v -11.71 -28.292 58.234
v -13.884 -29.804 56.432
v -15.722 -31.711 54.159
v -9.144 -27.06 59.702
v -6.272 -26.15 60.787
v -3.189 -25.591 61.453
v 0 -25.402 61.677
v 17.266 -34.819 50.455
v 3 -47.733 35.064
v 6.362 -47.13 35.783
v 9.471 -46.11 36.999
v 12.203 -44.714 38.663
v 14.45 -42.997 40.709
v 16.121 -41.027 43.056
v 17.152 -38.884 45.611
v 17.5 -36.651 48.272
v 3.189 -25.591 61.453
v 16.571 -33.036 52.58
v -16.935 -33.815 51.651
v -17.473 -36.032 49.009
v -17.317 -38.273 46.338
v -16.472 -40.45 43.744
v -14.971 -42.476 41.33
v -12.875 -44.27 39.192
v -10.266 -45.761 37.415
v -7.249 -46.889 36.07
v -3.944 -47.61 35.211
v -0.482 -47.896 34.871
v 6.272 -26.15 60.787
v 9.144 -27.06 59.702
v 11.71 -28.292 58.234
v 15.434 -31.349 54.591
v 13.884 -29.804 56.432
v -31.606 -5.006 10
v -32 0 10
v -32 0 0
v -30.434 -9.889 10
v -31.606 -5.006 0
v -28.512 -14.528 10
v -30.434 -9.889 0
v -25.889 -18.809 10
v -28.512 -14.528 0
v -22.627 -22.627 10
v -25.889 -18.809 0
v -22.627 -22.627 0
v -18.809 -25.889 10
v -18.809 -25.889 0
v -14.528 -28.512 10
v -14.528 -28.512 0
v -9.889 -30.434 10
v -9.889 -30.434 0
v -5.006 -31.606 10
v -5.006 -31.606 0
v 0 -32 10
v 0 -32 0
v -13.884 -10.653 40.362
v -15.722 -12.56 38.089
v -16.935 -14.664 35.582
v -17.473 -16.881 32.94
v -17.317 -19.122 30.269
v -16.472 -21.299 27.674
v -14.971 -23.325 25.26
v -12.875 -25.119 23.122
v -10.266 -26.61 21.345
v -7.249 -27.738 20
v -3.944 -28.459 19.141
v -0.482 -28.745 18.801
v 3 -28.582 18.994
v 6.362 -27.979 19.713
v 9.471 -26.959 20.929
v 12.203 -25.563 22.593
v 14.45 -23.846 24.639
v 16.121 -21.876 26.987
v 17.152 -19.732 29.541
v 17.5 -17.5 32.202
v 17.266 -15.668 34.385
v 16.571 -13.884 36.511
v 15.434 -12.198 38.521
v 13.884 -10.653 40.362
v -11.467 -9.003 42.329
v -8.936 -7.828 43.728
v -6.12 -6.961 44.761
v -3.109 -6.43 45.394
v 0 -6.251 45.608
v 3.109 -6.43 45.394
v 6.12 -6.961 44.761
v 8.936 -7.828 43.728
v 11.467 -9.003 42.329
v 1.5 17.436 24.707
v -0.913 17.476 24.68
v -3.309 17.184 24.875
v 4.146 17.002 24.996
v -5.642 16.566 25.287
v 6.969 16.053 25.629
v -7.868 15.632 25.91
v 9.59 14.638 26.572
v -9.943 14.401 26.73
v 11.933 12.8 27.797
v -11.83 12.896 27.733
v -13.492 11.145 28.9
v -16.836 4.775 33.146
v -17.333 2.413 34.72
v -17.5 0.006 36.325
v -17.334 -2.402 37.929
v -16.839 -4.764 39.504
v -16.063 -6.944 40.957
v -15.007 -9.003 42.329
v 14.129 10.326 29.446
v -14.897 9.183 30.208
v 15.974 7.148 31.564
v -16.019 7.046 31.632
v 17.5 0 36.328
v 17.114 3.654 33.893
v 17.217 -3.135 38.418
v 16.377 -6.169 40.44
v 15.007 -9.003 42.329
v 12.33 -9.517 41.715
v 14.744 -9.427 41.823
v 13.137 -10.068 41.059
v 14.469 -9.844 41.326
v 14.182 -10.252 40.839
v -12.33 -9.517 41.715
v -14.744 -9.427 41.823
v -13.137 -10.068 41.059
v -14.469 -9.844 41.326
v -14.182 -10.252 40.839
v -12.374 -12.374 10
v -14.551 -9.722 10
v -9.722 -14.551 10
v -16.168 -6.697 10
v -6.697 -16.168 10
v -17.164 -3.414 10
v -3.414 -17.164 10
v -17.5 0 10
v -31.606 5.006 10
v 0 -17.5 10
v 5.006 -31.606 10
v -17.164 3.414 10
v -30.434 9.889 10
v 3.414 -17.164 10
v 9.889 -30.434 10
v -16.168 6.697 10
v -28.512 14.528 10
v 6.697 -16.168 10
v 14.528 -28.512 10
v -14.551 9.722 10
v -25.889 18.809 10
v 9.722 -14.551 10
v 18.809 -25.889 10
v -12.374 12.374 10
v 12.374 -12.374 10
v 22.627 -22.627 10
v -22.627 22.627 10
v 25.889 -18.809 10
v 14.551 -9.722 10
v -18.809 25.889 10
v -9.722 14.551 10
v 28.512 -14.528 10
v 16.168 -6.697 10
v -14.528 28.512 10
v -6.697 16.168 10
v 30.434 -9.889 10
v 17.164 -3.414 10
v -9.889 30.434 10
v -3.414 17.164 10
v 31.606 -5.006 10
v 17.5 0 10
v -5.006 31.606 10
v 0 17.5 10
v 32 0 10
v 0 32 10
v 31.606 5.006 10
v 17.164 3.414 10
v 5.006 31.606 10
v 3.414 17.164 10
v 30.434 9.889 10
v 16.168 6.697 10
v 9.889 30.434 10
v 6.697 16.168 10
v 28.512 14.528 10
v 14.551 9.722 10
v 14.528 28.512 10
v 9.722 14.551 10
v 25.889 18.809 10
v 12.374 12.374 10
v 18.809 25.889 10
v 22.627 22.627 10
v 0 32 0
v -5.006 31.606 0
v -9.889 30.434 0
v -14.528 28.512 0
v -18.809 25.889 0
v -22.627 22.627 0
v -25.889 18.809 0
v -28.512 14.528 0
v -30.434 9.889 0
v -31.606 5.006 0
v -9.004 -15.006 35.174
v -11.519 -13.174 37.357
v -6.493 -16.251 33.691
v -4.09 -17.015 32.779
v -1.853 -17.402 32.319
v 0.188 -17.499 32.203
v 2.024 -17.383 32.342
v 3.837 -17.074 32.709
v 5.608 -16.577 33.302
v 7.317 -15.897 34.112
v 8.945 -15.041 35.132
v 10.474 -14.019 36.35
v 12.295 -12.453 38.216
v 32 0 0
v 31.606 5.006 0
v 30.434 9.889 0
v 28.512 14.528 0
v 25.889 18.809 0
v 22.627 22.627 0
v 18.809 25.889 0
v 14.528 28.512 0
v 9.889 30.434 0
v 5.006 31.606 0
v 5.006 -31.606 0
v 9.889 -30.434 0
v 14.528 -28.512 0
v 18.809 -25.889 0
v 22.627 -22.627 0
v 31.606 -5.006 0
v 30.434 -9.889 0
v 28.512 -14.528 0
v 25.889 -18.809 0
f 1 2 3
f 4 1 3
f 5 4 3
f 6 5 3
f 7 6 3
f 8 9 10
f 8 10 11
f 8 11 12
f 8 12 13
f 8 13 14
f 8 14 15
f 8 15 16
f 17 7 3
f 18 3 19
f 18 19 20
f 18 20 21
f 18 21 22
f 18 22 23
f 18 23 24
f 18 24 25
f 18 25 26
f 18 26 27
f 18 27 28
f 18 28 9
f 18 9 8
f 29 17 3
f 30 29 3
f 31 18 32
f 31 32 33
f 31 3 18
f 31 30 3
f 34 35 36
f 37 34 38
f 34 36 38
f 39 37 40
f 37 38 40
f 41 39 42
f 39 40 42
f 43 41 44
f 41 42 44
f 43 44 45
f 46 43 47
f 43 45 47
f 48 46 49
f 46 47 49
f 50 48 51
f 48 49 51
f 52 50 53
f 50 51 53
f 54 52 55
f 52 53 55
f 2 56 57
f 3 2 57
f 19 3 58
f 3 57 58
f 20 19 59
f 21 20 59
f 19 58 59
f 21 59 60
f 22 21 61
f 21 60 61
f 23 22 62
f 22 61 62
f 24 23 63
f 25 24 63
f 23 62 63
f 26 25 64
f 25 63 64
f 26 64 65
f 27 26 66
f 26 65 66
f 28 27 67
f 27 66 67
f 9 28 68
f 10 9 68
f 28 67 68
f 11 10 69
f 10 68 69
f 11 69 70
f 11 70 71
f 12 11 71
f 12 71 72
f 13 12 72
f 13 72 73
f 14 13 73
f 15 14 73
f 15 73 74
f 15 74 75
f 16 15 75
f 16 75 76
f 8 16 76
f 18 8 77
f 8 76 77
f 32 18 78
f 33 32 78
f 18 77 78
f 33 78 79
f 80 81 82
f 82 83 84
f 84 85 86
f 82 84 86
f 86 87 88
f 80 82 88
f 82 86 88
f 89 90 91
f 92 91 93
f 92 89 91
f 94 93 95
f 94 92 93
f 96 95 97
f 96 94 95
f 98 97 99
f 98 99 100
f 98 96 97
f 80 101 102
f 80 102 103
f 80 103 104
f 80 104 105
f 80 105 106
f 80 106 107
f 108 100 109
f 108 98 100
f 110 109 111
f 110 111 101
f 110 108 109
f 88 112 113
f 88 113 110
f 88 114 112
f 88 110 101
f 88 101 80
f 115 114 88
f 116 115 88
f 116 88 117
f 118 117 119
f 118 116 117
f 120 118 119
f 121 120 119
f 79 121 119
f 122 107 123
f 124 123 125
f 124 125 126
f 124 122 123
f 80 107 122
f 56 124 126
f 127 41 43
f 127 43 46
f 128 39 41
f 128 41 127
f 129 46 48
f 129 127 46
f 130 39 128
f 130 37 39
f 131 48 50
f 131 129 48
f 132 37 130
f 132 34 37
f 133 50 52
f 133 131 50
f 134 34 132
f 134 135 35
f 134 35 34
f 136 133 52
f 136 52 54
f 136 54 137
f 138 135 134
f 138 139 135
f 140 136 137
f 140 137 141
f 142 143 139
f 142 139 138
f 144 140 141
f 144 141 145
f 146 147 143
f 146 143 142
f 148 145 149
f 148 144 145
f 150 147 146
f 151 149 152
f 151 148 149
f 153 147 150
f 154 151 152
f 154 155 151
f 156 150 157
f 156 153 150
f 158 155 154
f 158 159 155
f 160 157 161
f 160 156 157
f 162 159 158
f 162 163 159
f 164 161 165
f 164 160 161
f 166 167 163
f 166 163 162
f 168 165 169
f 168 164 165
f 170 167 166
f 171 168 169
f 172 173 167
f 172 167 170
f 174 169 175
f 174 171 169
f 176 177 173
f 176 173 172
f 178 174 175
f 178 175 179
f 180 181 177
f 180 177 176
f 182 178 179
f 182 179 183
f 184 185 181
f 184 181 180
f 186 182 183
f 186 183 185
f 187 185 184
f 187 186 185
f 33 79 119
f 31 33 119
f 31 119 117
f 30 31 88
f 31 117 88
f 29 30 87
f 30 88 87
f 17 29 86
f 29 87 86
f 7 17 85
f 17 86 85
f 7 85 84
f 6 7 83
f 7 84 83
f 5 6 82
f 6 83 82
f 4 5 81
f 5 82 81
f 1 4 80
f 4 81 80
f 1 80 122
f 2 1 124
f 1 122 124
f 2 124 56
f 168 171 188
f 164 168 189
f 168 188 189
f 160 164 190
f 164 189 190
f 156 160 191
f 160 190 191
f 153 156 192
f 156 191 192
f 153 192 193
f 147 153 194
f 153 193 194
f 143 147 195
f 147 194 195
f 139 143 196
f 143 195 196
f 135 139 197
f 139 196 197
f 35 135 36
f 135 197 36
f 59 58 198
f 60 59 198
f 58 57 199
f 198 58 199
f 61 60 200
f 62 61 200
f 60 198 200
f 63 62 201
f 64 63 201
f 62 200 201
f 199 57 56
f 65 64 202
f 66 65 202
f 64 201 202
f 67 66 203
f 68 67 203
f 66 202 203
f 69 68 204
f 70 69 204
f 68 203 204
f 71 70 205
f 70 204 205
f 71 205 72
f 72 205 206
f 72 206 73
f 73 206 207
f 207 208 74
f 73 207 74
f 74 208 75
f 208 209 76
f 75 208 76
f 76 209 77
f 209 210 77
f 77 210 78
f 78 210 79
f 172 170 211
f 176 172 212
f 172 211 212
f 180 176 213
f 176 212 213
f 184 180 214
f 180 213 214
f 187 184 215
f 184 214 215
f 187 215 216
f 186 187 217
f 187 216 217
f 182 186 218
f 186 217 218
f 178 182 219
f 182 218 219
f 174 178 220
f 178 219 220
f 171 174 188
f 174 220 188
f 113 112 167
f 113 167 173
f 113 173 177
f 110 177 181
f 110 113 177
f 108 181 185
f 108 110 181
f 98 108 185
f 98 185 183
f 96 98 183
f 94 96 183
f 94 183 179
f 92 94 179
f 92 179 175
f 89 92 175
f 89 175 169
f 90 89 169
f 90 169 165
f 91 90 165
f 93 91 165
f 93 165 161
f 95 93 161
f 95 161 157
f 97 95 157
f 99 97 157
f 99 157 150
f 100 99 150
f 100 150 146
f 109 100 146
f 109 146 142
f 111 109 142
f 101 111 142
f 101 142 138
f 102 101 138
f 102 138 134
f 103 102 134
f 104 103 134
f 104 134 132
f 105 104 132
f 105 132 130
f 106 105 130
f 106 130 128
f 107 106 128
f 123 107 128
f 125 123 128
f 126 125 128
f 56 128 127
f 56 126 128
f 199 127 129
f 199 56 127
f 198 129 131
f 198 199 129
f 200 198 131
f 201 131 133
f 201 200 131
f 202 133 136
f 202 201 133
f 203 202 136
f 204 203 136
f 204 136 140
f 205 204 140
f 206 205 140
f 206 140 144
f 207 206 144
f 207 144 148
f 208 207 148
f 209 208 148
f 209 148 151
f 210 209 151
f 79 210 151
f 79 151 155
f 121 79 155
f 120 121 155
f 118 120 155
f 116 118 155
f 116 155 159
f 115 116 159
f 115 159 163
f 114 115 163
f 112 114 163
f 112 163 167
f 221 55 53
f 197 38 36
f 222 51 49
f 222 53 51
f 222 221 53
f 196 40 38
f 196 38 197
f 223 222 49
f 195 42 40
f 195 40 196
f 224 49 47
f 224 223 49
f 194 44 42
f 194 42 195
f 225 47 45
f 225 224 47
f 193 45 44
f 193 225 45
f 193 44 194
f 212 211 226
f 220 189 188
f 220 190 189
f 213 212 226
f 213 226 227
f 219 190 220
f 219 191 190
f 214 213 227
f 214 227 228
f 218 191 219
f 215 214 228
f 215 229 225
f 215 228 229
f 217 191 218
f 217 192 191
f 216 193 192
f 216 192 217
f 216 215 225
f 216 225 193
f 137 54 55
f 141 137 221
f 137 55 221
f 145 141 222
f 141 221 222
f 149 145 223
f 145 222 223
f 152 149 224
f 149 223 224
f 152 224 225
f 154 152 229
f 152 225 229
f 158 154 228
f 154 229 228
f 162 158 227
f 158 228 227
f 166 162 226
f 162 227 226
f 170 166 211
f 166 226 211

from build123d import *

# Parameters (mm, degrees)
F1_DEPTH = 32
F3_DEPTH = 50
F5_R     = 32
F5_R_2   = 17.5
F6_DEPTH = 40
F8_DEPTH = 25


with BuildPart() as f1:
    # F0 (on Right) → F1 (new body, symmetric)
    with BuildSketch(Plane.YZ):
        Polygon((-3.1593232416, 15), (32, 15), (-9.0026206753, 42.3286253849), (-31.9340601563, 15), align=None)
        Polygon((-32, 0), (32, 0), (32, 15), (-3.1593232416, 15), (-31.9340601563, 15), (-32, 15), align=None)
    extrude(amount=F1_DEPTH, both=True)

    # F2 (on face) → F3 (cut)
    with BuildSketch(Plane(origin=(0, 0, 0), x_dir=(1, 0, 0), z_dir=(0, 0, -1))):
        with BuildLine():
            ThreePointArc((-32, 0), (-22.6274170148, 22.6274169811), (-4.77e-08, 32))
            Line((-4.77e-08, 32), (-32, 32))
            Line((-32, 32), (-32, 0))
        make_face()
        with BuildLine():
            ThreePointArc((-4.77e-08, 32), (22.6274169811, 22.6274170148), (32, 0))
            Line((32, 0), (32, 32))
            Line((32, 32), (-4.77e-08, 32))
        make_face()
        with BuildLine():
            Line((32, -32), (32, 0))
            ThreePointArc((32, 0), (22.6274170148, -22.6274169811), (4.77e-08, -32))
            Line((4.77e-08, -32), (32, -32))
        make_face()
        with BuildLine():
            Line((-32, -32), (4.77e-08, -32))
            ThreePointArc((4.77e-08, -32), (-22.6274169811, -22.6274170148), (-32, 0))
            Line((-32, 0), (-32, -32))
        make_face()
    extrude(amount=-F3_DEPTH, mode=Mode.SUBTRACT)

    # F5 (on offset) → F6 (cut)
    with BuildSketch(Plane.XY.offset(50)):
        Circle(F5_R)
        Circle(F5_R_2, mode=Mode.SUBTRACT)
    extrude(amount=-F6_DEPTH, mode=Mode.SUBTRACT)

    # F7 (on face) → F8 (join)
    with BuildSketch(Plane(origin=(0, -26.1257339016, 21.9220936811), x_dir=(1, 0, 0), z_dir=(0, -0.7660444431, 0.6427876097))):
        with BuildLine():
            ThreePointArc((-13.8842207303, 24.0718845353), (-5.6247727608, -3.1521593573), (17.5, 13.4192597549))
            ThreePointArc((17.5, 13.4192597549), (16.5714191121, 19.0440325156), (13.8842207303, 24.0718845353))
            add(Edge.make_bspline(
                [(-13.8842207303, 24.0718845353), (0, -4.0807402451), (13.8842207303, 24.0718845353)],
                knots=[2.2441013689, 2.2441013689, 2.2441013689, 4.0390839383, 4.0390839383, 4.0390839383], degree=2, weights=[0.9413907542, 0.5730447129, 0.9413907542]))
        make_face()
        with BuildLine():
            add(Edge.make_bspline(
                [(-13.8842207303, 24.0718845353), (0, -4.0807402451), (13.8842207303, 24.0718845353)],
                knots=[2.2441013689, 2.2441013689, 2.2441013689, 4.0390839383, 4.0390839383, 4.0390839383], degree=2, weights=[0.9413907542, 0.5730447129, 0.9413907542]))
            ThreePointArc((13.8842207303, 24.0718845353), (12.7404400783, 25.4163921877), (11.4670320525, 26.6388352362))
            Line((11.4670320525, 26.6388352362), (-11.4670320525, 26.6388352362))
            ThreePointArc((-11.4670320525, 26.6388352362), (-12.7404400783, 25.4163921877), (-13.8842207303, 24.0718845353))
        make_face()
        with BuildLine():
            Line((-11.4670320525, 26.6388352362), (11.4670320525, 26.6388352362))
            ThreePointArc((11.4670320525, 26.6388352362), (0, 30.9192597549), (-11.4670320525, 26.6388352362))
        make_face()
    extrude(amount=F8_DEPTH)


solid = f1.part
